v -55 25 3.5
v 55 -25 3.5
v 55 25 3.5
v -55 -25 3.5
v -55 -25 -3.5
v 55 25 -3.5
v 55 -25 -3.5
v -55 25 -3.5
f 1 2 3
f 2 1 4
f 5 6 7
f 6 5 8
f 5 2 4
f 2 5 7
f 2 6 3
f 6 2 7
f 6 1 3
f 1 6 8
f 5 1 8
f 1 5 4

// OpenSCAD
// A mounting plate: add a hole on the broad top face, then change length.
length = 110;
width = 50;
thickness = 7;
cube([length,width,thickness],center=true);
